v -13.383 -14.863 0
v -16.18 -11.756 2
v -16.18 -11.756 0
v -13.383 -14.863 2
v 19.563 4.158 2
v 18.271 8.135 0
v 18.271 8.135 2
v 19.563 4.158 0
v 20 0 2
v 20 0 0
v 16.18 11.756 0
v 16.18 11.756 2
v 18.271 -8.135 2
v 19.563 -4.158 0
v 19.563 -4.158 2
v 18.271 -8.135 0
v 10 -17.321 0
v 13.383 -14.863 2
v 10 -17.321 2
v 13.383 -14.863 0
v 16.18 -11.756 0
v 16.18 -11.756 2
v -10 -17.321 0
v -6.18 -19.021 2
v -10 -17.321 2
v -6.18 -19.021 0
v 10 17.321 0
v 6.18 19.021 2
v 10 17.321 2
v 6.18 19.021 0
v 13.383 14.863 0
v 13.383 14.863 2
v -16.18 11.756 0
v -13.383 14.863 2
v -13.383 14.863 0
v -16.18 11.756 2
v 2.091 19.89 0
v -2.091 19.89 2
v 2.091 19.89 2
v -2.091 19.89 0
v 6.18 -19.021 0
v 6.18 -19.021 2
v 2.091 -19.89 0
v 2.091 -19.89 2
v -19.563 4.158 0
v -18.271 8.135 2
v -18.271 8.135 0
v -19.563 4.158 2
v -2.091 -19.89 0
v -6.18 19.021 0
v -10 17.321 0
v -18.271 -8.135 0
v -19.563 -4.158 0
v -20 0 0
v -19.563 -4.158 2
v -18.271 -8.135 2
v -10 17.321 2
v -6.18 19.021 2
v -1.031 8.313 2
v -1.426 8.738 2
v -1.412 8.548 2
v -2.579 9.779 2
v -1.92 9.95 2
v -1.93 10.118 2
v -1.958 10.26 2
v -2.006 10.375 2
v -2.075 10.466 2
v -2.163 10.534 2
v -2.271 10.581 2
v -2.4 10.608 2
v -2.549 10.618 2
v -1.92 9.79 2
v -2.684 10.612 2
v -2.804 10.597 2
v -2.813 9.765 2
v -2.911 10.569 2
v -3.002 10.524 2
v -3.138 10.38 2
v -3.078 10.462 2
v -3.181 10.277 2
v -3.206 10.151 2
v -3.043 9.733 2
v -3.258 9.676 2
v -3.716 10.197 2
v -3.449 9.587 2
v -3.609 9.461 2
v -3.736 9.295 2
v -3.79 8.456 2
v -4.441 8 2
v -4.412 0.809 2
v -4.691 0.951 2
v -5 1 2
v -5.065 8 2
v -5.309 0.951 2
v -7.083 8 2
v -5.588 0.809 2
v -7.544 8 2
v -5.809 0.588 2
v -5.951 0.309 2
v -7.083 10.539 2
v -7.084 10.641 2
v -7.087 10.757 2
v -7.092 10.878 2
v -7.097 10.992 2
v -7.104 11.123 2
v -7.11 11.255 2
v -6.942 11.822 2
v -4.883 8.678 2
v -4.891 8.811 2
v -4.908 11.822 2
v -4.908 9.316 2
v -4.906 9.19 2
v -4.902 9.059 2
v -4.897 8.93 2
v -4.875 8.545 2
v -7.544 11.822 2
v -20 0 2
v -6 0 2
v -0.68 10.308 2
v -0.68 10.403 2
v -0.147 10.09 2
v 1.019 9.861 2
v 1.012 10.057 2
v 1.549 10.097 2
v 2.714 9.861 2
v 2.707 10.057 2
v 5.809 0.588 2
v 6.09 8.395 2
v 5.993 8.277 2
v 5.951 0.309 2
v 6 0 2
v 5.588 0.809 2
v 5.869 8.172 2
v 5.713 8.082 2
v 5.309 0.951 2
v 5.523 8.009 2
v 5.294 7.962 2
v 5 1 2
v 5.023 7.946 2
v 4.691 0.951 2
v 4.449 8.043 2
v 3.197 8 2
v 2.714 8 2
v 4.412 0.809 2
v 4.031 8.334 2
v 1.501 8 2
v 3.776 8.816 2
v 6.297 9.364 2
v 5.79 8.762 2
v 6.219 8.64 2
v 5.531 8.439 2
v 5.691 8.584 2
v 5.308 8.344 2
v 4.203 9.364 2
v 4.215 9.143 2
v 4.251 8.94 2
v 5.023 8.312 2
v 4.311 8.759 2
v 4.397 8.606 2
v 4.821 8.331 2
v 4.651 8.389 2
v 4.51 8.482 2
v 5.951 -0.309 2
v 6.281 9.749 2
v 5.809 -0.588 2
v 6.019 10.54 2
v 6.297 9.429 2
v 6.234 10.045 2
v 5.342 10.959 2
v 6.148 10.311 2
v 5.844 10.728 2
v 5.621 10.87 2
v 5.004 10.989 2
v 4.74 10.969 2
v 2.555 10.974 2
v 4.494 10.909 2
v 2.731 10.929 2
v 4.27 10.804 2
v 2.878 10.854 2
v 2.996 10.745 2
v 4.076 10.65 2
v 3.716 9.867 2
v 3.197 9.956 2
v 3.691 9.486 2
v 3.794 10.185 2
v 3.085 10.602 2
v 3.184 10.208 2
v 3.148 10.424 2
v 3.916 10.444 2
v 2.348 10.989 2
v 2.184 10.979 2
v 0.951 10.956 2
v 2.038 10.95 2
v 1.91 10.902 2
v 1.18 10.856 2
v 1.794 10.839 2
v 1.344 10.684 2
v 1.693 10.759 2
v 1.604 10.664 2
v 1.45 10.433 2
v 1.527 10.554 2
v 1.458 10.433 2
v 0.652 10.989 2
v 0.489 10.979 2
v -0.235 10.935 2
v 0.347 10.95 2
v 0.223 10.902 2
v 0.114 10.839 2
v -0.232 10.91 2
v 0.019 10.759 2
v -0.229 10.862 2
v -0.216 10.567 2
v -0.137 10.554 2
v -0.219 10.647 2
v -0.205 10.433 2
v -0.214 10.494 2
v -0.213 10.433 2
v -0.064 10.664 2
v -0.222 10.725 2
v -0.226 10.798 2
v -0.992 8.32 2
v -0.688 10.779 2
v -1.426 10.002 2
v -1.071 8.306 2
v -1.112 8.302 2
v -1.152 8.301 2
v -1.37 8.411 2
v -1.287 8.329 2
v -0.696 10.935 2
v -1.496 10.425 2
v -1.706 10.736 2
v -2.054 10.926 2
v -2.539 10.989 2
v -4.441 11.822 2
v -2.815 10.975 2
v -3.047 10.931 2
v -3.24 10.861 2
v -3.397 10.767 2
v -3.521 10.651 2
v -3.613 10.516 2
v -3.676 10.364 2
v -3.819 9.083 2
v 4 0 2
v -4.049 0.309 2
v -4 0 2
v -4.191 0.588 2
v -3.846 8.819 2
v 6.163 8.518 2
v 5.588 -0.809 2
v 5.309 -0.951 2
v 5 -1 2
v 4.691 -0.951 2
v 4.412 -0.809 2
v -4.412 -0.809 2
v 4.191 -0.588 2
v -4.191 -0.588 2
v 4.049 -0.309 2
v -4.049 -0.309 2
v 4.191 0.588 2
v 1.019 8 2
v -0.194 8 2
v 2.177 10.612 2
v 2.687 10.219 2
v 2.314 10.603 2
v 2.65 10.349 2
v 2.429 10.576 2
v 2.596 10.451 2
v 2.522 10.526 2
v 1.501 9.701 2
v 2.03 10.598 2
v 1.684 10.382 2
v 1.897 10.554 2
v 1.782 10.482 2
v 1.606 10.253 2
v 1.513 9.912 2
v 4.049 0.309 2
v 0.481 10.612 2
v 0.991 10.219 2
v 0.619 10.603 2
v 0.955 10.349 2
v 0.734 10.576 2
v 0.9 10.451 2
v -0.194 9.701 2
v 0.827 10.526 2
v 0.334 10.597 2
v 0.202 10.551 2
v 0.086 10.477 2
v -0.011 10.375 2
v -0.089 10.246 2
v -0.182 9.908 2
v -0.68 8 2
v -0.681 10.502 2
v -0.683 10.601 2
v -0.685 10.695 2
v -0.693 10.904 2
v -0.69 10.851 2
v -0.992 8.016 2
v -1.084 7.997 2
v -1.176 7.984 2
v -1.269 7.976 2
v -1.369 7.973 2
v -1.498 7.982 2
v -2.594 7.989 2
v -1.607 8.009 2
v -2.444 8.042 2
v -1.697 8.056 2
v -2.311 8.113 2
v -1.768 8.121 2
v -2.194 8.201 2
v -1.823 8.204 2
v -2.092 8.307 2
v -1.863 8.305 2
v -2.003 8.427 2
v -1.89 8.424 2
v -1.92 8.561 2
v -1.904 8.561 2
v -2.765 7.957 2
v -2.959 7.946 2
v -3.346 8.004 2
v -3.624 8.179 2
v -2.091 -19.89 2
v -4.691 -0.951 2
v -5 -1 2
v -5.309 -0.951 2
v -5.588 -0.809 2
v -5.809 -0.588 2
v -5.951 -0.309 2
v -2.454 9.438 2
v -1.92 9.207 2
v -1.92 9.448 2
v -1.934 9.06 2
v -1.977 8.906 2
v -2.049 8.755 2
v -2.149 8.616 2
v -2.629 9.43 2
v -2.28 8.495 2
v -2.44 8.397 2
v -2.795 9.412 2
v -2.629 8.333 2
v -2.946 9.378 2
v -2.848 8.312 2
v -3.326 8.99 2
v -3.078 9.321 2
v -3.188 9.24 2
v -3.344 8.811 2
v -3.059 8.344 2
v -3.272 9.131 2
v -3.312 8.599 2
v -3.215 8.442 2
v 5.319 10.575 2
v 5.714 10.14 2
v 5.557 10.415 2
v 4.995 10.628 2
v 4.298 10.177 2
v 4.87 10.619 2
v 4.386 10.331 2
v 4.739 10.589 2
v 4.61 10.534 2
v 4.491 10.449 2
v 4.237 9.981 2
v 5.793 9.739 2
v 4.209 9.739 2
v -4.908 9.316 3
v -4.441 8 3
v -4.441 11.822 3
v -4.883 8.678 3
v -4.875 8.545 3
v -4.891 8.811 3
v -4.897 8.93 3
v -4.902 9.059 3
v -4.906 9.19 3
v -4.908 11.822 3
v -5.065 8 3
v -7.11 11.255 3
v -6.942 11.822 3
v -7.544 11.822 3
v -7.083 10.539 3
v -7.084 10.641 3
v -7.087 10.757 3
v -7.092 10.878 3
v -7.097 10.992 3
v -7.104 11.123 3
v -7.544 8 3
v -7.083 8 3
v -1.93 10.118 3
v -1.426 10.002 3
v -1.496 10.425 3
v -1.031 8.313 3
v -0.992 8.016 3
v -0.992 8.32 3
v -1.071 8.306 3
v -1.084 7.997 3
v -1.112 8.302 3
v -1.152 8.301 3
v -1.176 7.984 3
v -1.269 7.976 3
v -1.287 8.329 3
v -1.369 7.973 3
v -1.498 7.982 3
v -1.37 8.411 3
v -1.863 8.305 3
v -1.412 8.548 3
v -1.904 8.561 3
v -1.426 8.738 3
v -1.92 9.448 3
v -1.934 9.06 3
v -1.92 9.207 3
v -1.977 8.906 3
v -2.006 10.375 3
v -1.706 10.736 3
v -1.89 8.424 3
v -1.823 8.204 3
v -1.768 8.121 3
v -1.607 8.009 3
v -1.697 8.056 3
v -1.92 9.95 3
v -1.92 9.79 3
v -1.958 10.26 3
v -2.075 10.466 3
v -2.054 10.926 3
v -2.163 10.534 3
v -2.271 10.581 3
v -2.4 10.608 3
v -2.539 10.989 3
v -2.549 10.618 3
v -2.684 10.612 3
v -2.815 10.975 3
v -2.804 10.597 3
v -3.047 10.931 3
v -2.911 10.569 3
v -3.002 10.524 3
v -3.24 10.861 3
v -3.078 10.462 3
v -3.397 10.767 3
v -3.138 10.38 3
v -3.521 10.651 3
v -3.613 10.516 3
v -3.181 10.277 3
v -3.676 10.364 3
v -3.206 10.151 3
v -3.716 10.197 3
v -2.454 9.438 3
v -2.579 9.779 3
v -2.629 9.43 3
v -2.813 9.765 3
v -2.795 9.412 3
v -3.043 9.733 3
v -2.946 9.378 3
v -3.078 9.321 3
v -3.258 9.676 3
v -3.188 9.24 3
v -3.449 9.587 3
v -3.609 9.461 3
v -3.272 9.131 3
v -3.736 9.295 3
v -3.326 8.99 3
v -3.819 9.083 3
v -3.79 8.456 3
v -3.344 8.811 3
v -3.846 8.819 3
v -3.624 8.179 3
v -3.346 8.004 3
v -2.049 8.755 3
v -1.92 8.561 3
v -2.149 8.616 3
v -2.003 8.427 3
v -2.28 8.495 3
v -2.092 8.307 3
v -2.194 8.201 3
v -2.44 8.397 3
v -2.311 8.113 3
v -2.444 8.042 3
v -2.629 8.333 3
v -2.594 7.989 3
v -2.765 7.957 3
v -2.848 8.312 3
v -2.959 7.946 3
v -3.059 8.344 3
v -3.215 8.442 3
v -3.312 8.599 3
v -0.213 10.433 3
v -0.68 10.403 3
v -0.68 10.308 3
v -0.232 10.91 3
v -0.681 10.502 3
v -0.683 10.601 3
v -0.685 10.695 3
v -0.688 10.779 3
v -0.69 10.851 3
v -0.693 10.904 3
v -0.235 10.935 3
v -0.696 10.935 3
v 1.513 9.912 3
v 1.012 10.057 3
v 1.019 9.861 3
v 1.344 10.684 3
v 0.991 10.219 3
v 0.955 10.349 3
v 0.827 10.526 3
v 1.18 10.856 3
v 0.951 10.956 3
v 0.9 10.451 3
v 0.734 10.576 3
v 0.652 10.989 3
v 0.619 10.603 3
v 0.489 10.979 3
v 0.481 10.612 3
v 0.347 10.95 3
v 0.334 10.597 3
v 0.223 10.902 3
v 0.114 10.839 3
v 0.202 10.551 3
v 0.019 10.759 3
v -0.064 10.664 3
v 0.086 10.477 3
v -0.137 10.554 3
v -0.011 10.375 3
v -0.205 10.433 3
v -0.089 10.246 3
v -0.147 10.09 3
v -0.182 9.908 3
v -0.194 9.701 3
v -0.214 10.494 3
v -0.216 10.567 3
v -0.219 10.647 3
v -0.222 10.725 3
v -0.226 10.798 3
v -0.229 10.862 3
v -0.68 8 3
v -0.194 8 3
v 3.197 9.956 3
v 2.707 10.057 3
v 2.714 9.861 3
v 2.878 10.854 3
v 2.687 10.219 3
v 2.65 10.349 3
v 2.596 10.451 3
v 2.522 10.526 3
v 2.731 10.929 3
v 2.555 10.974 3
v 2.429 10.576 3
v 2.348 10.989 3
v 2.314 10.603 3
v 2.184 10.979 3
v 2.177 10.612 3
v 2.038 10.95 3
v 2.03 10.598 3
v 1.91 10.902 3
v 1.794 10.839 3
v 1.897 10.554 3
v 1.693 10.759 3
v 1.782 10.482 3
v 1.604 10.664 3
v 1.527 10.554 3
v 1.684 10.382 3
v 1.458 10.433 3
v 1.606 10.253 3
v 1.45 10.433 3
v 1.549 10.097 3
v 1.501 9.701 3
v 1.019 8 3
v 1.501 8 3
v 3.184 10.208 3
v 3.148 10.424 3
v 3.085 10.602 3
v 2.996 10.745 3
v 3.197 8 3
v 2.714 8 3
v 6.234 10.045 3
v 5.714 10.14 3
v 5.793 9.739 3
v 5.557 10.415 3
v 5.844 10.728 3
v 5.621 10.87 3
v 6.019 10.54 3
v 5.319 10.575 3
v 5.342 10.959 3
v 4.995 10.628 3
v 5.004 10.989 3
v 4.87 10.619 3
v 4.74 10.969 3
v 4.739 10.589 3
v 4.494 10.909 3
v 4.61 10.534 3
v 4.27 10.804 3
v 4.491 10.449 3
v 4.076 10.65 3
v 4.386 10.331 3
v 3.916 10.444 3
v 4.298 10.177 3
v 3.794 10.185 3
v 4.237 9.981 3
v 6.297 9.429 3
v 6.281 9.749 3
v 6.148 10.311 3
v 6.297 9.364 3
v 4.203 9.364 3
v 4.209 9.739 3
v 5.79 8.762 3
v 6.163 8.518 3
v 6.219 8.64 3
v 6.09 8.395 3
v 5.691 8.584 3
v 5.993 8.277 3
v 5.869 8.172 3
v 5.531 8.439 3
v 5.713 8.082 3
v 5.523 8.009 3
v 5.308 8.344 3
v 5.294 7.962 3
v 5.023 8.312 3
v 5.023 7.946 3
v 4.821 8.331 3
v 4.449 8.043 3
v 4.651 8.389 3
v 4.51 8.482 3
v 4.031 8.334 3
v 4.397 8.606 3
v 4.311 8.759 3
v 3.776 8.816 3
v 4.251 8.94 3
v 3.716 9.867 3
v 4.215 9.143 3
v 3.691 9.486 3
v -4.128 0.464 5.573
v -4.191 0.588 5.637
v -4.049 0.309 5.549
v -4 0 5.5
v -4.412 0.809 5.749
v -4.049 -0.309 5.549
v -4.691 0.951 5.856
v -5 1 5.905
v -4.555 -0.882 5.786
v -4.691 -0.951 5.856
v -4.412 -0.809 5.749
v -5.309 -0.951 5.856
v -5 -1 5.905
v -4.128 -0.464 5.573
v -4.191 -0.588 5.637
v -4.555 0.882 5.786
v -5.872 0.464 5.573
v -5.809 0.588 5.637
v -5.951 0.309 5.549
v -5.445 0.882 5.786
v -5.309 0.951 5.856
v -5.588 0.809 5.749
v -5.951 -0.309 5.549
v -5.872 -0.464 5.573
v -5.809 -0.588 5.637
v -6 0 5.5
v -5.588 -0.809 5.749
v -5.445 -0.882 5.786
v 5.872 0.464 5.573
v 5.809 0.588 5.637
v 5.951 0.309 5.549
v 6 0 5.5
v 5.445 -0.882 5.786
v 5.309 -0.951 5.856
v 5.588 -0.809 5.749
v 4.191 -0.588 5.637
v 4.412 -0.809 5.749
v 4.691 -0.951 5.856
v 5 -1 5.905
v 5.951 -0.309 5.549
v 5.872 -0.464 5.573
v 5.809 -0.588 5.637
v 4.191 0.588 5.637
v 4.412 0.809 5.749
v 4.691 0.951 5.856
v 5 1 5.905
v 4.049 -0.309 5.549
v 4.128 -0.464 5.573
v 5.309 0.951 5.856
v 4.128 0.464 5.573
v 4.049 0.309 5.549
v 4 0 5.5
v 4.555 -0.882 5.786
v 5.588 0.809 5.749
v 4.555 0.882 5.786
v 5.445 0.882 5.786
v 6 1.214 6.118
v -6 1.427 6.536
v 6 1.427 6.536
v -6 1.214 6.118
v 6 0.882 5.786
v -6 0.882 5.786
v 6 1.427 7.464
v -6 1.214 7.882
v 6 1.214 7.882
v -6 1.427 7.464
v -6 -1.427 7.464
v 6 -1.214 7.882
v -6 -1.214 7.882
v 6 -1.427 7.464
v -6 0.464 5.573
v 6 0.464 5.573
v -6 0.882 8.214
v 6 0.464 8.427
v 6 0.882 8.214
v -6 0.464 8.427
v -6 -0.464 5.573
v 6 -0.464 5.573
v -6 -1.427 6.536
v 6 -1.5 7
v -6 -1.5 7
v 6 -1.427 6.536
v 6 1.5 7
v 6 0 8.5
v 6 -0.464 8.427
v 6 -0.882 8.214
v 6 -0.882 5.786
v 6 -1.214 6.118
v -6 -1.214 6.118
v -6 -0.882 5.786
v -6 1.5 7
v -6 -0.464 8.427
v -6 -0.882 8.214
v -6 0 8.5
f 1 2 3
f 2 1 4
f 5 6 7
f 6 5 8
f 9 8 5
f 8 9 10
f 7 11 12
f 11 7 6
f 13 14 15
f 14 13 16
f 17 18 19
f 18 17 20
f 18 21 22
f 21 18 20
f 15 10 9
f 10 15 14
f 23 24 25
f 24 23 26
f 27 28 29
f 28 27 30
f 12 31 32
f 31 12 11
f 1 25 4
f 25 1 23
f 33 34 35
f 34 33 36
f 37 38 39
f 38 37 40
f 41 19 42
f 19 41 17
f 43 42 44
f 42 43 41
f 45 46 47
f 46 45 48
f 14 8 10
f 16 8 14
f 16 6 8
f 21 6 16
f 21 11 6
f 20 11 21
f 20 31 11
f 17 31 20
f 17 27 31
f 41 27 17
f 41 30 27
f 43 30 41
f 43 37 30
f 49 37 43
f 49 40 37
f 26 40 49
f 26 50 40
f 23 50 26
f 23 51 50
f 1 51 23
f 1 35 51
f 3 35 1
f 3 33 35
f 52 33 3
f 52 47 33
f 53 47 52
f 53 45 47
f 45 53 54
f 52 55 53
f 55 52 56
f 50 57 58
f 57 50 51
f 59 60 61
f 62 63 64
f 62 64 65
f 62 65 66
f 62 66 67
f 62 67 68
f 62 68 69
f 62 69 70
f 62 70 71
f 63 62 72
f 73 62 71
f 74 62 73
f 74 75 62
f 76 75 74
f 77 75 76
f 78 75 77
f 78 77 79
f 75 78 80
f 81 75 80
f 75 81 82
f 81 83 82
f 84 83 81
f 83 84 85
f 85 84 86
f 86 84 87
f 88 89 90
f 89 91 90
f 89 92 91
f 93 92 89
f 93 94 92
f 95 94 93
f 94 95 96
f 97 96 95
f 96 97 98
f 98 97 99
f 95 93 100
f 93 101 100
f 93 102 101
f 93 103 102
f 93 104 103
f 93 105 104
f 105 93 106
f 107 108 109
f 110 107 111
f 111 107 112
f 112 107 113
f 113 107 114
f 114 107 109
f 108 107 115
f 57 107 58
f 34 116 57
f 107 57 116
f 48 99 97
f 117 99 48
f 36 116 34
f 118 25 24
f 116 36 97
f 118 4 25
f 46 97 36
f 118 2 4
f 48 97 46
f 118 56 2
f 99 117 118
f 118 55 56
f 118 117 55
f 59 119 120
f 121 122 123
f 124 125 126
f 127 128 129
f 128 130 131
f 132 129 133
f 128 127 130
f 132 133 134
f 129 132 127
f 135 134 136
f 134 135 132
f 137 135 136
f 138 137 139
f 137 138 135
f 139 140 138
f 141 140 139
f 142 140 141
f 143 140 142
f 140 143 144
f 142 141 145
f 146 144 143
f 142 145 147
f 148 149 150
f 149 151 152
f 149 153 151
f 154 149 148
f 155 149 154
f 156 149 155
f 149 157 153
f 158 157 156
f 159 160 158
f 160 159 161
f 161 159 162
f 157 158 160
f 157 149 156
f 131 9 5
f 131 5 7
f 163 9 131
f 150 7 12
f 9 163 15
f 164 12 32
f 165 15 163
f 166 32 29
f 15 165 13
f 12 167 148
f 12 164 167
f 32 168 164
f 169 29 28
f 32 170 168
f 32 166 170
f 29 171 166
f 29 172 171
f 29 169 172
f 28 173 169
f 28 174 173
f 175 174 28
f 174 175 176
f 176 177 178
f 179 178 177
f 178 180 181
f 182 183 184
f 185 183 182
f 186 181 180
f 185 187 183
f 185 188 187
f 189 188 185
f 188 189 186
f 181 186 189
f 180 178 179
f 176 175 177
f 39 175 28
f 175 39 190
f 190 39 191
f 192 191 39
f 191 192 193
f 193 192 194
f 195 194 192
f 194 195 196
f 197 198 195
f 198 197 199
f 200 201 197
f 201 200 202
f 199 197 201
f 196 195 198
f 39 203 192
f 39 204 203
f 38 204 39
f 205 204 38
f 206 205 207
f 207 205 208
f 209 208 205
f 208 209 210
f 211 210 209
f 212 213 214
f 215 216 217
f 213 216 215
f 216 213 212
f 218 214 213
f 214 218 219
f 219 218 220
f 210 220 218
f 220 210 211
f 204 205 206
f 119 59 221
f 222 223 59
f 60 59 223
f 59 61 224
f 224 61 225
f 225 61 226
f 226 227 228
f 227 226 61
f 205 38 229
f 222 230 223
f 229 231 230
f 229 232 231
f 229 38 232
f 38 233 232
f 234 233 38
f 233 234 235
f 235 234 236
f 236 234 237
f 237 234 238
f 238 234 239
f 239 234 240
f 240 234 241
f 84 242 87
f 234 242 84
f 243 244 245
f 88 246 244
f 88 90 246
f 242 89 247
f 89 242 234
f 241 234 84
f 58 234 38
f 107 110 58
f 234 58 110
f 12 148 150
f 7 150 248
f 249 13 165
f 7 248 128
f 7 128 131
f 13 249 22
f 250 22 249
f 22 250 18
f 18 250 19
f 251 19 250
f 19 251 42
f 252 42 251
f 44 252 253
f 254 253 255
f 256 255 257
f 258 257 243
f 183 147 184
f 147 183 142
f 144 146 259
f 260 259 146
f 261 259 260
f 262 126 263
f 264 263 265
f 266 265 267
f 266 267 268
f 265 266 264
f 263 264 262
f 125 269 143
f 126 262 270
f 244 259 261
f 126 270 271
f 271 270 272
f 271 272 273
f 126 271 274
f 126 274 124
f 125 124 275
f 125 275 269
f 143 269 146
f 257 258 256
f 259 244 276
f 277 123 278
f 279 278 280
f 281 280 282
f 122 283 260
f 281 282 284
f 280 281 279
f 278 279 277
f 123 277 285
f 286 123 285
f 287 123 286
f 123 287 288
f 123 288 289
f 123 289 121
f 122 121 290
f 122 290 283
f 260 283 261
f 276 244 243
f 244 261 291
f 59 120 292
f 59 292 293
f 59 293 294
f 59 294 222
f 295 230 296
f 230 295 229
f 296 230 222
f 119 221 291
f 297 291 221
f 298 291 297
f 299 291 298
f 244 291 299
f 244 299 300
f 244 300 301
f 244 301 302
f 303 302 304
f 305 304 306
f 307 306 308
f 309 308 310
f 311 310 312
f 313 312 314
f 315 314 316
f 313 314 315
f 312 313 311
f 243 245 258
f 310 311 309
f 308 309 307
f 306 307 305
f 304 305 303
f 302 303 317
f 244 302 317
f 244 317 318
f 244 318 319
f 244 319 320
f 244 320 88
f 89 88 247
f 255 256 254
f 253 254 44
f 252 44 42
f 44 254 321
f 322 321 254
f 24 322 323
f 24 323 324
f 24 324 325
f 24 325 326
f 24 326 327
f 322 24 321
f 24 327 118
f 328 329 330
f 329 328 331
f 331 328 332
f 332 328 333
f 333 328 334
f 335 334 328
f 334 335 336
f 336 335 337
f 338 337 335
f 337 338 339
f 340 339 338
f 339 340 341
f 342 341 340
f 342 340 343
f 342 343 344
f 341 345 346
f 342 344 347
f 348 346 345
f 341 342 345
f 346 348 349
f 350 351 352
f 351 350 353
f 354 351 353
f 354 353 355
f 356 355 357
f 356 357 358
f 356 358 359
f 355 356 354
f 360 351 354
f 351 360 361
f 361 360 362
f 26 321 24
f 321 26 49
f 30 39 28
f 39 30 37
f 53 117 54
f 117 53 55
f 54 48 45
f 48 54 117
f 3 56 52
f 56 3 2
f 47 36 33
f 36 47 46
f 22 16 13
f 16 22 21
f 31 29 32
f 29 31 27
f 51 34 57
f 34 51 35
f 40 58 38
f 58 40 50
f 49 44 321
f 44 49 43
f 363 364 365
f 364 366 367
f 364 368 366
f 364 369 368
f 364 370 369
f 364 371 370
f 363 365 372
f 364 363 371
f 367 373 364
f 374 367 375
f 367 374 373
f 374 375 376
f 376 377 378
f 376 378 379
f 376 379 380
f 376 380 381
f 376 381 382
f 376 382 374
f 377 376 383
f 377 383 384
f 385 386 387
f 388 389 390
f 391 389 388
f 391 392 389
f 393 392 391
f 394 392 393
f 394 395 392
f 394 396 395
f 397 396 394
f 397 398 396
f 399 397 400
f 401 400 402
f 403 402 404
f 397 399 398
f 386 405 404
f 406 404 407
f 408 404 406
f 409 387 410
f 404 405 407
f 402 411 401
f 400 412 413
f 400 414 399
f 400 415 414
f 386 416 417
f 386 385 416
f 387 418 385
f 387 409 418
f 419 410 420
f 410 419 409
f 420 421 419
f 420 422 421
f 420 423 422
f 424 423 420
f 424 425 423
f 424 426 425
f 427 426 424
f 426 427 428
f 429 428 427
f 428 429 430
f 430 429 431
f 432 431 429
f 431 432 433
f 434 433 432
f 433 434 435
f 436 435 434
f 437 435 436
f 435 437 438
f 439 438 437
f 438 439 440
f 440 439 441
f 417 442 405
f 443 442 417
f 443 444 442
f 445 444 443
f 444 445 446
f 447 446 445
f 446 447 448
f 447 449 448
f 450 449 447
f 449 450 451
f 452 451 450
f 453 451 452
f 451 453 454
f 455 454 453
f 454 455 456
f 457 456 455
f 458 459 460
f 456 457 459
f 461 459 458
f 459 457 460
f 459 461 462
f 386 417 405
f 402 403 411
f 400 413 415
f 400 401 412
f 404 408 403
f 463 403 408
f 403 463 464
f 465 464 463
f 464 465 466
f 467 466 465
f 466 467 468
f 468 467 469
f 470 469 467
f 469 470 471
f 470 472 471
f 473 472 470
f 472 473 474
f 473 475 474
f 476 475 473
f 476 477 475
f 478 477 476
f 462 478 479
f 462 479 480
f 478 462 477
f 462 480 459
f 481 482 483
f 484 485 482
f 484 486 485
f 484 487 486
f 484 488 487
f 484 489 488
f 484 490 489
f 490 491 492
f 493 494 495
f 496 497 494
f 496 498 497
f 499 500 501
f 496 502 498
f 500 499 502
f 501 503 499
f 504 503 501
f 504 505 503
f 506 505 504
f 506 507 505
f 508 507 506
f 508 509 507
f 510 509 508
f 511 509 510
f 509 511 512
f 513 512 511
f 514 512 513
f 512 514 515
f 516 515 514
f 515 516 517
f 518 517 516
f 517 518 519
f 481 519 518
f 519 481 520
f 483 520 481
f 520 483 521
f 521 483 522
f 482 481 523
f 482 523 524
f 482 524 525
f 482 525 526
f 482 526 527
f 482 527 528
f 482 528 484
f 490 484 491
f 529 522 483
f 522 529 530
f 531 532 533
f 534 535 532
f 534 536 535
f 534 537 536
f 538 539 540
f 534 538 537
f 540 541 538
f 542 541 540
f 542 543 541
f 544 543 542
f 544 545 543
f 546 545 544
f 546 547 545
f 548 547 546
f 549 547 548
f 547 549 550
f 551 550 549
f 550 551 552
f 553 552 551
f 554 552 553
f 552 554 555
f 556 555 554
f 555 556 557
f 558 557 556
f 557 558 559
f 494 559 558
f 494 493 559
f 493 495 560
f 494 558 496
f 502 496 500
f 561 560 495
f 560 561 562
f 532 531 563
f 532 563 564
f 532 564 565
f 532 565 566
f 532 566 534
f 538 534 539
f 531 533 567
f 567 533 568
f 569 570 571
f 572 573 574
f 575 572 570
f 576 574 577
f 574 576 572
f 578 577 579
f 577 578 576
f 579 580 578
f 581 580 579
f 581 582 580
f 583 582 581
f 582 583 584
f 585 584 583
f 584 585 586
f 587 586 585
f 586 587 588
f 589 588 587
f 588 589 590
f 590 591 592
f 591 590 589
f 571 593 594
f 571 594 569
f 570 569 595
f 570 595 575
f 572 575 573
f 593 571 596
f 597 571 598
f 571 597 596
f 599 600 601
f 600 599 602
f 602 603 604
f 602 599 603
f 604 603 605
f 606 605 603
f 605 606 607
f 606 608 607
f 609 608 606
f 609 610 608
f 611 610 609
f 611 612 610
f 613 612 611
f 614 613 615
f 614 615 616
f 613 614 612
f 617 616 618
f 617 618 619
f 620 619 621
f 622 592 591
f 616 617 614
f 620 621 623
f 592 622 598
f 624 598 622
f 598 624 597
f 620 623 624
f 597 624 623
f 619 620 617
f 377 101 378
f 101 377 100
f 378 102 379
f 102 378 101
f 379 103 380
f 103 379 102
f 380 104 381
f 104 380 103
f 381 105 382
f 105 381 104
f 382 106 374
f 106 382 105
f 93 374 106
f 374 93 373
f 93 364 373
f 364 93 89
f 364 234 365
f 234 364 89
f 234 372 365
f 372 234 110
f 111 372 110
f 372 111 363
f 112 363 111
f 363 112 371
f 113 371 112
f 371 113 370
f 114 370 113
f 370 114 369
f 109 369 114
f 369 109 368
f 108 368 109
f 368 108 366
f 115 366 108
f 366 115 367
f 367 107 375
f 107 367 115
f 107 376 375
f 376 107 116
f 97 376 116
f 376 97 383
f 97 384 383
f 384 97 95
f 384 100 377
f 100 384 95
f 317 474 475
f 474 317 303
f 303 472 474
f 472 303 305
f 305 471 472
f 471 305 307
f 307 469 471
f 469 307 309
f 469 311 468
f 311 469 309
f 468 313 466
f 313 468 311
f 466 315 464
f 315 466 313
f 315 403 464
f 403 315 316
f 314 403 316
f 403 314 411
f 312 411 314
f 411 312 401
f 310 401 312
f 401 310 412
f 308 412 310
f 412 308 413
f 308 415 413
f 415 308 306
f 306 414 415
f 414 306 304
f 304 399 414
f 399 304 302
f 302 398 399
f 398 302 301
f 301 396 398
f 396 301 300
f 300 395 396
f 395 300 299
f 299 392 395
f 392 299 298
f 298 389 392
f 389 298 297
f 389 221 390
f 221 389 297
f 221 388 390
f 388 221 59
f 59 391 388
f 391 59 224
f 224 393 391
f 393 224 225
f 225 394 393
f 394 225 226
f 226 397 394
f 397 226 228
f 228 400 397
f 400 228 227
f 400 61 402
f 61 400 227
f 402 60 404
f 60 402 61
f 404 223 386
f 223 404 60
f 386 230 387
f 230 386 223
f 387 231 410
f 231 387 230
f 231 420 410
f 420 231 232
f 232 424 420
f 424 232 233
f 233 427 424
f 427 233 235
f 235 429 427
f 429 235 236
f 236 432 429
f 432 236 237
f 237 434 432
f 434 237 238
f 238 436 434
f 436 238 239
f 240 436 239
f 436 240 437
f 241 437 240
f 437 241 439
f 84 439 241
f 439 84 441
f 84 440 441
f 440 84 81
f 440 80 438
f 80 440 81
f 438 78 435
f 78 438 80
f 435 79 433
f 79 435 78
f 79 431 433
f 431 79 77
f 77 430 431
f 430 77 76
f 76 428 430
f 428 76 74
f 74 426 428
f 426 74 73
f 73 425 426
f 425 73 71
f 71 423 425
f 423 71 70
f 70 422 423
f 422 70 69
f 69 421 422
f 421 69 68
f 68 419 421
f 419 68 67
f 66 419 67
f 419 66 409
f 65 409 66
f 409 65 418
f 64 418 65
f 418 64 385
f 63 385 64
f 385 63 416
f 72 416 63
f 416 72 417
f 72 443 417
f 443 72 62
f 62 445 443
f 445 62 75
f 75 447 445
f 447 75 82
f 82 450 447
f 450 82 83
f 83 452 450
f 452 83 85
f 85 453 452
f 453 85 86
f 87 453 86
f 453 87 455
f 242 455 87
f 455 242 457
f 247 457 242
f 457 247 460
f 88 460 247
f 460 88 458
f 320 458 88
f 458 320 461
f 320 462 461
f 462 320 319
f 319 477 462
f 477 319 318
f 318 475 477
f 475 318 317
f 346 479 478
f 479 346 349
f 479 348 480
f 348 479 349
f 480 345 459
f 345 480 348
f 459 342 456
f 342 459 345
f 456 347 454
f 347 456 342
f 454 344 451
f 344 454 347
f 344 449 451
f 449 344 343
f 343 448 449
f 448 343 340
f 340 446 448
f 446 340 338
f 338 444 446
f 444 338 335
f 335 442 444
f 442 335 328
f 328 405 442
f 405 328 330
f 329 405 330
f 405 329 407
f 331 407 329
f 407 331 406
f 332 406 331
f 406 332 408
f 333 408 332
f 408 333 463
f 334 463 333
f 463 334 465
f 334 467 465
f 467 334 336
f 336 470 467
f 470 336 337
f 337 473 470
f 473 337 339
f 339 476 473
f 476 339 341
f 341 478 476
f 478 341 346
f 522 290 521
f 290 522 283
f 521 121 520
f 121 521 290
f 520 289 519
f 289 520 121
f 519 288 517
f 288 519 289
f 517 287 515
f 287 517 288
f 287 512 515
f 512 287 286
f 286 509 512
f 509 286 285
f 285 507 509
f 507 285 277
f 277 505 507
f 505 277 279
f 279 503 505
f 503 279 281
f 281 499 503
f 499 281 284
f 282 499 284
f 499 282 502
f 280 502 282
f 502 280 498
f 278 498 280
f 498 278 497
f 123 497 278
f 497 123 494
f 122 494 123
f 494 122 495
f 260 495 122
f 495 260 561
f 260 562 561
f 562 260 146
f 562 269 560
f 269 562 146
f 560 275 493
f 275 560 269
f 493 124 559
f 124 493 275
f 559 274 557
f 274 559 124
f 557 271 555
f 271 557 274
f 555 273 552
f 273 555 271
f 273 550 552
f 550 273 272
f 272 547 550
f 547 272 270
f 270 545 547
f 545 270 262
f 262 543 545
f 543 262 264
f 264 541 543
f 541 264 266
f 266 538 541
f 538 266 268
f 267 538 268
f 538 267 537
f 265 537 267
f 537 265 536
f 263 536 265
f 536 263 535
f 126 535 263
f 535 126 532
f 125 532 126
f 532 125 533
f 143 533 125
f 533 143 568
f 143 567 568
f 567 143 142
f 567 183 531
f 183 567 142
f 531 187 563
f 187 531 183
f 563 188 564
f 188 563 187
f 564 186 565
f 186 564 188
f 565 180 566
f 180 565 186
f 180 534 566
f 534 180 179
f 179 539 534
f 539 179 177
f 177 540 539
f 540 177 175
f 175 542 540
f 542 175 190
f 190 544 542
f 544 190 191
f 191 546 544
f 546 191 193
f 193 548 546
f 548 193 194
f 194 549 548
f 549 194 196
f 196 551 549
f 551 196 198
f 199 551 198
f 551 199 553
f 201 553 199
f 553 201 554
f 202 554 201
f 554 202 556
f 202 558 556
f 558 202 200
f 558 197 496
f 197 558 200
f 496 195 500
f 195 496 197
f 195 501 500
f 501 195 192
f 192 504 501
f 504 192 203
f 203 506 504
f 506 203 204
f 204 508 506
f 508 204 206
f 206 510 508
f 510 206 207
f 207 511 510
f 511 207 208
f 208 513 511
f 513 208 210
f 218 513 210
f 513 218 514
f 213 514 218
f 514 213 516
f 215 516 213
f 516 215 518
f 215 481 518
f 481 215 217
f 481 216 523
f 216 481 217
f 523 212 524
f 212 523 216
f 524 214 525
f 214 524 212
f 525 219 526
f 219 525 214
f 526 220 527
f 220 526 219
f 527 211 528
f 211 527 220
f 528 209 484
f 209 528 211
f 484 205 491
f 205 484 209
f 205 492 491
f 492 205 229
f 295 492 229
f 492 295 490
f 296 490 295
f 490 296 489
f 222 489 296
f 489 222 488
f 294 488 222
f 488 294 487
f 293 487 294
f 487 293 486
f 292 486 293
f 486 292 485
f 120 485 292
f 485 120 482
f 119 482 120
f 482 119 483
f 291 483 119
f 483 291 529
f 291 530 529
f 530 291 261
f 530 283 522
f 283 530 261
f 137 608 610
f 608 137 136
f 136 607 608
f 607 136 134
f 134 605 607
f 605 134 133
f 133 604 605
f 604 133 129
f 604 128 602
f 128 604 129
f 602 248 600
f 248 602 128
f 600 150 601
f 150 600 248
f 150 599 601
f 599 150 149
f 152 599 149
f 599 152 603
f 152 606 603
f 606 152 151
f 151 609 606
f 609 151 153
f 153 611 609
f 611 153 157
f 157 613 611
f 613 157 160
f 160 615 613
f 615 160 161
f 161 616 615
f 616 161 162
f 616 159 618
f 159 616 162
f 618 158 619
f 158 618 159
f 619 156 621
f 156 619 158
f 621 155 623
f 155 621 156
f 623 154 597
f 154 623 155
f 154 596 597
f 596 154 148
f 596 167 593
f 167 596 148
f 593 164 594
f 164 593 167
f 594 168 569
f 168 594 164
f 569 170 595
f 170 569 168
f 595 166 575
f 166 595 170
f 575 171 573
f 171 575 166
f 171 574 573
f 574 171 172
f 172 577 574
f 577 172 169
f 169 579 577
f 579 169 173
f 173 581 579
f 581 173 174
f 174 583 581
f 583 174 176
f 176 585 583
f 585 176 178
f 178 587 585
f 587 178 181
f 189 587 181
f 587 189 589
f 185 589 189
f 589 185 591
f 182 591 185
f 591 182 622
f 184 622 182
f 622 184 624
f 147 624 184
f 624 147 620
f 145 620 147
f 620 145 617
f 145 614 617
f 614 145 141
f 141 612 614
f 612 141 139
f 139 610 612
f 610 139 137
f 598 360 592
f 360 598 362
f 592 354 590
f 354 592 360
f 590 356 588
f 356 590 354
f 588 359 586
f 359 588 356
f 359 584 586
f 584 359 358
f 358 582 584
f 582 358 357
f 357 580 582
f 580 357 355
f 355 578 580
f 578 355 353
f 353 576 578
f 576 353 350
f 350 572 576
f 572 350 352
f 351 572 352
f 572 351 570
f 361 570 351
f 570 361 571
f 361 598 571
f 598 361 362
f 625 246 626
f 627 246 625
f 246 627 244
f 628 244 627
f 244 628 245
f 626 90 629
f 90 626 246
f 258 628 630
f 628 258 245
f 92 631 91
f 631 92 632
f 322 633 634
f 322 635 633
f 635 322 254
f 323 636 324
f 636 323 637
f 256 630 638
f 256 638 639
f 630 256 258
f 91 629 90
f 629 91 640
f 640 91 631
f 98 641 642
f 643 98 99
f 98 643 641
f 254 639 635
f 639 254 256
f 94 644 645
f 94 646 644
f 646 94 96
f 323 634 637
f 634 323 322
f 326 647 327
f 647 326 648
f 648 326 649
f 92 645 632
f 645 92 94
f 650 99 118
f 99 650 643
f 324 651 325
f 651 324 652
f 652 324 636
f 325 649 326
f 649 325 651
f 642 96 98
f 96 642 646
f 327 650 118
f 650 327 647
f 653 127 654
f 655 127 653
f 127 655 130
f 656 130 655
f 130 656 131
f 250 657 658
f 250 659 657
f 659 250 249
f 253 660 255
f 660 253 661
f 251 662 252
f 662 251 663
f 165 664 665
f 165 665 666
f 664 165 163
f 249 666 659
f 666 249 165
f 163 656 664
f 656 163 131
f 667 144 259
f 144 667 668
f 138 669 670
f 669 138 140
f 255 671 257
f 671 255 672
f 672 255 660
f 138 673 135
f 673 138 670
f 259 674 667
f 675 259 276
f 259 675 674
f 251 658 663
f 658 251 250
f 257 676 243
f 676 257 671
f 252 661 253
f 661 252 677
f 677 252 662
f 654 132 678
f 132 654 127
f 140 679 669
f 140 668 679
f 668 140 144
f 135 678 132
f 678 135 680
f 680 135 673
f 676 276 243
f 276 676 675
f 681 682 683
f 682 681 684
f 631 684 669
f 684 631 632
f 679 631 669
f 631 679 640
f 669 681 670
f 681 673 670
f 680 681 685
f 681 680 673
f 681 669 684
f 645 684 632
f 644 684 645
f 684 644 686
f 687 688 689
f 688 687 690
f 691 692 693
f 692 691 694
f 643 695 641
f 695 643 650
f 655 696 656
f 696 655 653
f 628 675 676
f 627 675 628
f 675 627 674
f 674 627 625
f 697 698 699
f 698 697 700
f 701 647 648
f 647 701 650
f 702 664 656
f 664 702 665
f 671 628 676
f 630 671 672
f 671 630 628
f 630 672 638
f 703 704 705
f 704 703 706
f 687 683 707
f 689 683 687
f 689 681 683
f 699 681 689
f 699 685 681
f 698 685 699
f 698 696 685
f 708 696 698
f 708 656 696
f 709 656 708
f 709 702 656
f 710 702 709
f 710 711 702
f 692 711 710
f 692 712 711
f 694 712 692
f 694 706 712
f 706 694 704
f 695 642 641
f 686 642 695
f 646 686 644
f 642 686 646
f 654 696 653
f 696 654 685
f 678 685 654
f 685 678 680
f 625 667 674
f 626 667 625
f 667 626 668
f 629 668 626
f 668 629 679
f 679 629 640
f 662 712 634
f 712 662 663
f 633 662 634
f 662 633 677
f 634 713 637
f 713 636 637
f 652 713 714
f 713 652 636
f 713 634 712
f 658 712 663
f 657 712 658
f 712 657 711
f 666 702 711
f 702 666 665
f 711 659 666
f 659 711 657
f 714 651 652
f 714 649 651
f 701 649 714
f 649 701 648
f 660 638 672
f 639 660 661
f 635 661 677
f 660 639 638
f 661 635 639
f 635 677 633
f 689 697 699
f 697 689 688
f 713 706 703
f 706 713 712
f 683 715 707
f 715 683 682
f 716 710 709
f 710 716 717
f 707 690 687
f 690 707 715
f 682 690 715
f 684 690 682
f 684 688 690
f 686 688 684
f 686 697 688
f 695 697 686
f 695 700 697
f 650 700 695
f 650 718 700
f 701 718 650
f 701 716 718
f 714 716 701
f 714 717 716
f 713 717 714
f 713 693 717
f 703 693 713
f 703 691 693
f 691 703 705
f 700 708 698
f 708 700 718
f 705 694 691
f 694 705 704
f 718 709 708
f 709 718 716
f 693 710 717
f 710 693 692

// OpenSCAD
echo(version=version());
 
 name = "Name"; 
 
 color("grey")   
 cylinder(h=2, r=20);
 color("red")
 translate([-8, 8, 2])
    linear_extrude(1)
        text(name, size = 4);
 
translate([-5, 0, 2]) cylinder(h=5, r=1,$fn=20);

translate([5, 0, 2]) cylinder(h=5, r=1,$fn=20);

translate([-6, 0, 7]) 
    rotate([90,90,90])
        cylinder(h=12, r=1.5,$fn=20);
